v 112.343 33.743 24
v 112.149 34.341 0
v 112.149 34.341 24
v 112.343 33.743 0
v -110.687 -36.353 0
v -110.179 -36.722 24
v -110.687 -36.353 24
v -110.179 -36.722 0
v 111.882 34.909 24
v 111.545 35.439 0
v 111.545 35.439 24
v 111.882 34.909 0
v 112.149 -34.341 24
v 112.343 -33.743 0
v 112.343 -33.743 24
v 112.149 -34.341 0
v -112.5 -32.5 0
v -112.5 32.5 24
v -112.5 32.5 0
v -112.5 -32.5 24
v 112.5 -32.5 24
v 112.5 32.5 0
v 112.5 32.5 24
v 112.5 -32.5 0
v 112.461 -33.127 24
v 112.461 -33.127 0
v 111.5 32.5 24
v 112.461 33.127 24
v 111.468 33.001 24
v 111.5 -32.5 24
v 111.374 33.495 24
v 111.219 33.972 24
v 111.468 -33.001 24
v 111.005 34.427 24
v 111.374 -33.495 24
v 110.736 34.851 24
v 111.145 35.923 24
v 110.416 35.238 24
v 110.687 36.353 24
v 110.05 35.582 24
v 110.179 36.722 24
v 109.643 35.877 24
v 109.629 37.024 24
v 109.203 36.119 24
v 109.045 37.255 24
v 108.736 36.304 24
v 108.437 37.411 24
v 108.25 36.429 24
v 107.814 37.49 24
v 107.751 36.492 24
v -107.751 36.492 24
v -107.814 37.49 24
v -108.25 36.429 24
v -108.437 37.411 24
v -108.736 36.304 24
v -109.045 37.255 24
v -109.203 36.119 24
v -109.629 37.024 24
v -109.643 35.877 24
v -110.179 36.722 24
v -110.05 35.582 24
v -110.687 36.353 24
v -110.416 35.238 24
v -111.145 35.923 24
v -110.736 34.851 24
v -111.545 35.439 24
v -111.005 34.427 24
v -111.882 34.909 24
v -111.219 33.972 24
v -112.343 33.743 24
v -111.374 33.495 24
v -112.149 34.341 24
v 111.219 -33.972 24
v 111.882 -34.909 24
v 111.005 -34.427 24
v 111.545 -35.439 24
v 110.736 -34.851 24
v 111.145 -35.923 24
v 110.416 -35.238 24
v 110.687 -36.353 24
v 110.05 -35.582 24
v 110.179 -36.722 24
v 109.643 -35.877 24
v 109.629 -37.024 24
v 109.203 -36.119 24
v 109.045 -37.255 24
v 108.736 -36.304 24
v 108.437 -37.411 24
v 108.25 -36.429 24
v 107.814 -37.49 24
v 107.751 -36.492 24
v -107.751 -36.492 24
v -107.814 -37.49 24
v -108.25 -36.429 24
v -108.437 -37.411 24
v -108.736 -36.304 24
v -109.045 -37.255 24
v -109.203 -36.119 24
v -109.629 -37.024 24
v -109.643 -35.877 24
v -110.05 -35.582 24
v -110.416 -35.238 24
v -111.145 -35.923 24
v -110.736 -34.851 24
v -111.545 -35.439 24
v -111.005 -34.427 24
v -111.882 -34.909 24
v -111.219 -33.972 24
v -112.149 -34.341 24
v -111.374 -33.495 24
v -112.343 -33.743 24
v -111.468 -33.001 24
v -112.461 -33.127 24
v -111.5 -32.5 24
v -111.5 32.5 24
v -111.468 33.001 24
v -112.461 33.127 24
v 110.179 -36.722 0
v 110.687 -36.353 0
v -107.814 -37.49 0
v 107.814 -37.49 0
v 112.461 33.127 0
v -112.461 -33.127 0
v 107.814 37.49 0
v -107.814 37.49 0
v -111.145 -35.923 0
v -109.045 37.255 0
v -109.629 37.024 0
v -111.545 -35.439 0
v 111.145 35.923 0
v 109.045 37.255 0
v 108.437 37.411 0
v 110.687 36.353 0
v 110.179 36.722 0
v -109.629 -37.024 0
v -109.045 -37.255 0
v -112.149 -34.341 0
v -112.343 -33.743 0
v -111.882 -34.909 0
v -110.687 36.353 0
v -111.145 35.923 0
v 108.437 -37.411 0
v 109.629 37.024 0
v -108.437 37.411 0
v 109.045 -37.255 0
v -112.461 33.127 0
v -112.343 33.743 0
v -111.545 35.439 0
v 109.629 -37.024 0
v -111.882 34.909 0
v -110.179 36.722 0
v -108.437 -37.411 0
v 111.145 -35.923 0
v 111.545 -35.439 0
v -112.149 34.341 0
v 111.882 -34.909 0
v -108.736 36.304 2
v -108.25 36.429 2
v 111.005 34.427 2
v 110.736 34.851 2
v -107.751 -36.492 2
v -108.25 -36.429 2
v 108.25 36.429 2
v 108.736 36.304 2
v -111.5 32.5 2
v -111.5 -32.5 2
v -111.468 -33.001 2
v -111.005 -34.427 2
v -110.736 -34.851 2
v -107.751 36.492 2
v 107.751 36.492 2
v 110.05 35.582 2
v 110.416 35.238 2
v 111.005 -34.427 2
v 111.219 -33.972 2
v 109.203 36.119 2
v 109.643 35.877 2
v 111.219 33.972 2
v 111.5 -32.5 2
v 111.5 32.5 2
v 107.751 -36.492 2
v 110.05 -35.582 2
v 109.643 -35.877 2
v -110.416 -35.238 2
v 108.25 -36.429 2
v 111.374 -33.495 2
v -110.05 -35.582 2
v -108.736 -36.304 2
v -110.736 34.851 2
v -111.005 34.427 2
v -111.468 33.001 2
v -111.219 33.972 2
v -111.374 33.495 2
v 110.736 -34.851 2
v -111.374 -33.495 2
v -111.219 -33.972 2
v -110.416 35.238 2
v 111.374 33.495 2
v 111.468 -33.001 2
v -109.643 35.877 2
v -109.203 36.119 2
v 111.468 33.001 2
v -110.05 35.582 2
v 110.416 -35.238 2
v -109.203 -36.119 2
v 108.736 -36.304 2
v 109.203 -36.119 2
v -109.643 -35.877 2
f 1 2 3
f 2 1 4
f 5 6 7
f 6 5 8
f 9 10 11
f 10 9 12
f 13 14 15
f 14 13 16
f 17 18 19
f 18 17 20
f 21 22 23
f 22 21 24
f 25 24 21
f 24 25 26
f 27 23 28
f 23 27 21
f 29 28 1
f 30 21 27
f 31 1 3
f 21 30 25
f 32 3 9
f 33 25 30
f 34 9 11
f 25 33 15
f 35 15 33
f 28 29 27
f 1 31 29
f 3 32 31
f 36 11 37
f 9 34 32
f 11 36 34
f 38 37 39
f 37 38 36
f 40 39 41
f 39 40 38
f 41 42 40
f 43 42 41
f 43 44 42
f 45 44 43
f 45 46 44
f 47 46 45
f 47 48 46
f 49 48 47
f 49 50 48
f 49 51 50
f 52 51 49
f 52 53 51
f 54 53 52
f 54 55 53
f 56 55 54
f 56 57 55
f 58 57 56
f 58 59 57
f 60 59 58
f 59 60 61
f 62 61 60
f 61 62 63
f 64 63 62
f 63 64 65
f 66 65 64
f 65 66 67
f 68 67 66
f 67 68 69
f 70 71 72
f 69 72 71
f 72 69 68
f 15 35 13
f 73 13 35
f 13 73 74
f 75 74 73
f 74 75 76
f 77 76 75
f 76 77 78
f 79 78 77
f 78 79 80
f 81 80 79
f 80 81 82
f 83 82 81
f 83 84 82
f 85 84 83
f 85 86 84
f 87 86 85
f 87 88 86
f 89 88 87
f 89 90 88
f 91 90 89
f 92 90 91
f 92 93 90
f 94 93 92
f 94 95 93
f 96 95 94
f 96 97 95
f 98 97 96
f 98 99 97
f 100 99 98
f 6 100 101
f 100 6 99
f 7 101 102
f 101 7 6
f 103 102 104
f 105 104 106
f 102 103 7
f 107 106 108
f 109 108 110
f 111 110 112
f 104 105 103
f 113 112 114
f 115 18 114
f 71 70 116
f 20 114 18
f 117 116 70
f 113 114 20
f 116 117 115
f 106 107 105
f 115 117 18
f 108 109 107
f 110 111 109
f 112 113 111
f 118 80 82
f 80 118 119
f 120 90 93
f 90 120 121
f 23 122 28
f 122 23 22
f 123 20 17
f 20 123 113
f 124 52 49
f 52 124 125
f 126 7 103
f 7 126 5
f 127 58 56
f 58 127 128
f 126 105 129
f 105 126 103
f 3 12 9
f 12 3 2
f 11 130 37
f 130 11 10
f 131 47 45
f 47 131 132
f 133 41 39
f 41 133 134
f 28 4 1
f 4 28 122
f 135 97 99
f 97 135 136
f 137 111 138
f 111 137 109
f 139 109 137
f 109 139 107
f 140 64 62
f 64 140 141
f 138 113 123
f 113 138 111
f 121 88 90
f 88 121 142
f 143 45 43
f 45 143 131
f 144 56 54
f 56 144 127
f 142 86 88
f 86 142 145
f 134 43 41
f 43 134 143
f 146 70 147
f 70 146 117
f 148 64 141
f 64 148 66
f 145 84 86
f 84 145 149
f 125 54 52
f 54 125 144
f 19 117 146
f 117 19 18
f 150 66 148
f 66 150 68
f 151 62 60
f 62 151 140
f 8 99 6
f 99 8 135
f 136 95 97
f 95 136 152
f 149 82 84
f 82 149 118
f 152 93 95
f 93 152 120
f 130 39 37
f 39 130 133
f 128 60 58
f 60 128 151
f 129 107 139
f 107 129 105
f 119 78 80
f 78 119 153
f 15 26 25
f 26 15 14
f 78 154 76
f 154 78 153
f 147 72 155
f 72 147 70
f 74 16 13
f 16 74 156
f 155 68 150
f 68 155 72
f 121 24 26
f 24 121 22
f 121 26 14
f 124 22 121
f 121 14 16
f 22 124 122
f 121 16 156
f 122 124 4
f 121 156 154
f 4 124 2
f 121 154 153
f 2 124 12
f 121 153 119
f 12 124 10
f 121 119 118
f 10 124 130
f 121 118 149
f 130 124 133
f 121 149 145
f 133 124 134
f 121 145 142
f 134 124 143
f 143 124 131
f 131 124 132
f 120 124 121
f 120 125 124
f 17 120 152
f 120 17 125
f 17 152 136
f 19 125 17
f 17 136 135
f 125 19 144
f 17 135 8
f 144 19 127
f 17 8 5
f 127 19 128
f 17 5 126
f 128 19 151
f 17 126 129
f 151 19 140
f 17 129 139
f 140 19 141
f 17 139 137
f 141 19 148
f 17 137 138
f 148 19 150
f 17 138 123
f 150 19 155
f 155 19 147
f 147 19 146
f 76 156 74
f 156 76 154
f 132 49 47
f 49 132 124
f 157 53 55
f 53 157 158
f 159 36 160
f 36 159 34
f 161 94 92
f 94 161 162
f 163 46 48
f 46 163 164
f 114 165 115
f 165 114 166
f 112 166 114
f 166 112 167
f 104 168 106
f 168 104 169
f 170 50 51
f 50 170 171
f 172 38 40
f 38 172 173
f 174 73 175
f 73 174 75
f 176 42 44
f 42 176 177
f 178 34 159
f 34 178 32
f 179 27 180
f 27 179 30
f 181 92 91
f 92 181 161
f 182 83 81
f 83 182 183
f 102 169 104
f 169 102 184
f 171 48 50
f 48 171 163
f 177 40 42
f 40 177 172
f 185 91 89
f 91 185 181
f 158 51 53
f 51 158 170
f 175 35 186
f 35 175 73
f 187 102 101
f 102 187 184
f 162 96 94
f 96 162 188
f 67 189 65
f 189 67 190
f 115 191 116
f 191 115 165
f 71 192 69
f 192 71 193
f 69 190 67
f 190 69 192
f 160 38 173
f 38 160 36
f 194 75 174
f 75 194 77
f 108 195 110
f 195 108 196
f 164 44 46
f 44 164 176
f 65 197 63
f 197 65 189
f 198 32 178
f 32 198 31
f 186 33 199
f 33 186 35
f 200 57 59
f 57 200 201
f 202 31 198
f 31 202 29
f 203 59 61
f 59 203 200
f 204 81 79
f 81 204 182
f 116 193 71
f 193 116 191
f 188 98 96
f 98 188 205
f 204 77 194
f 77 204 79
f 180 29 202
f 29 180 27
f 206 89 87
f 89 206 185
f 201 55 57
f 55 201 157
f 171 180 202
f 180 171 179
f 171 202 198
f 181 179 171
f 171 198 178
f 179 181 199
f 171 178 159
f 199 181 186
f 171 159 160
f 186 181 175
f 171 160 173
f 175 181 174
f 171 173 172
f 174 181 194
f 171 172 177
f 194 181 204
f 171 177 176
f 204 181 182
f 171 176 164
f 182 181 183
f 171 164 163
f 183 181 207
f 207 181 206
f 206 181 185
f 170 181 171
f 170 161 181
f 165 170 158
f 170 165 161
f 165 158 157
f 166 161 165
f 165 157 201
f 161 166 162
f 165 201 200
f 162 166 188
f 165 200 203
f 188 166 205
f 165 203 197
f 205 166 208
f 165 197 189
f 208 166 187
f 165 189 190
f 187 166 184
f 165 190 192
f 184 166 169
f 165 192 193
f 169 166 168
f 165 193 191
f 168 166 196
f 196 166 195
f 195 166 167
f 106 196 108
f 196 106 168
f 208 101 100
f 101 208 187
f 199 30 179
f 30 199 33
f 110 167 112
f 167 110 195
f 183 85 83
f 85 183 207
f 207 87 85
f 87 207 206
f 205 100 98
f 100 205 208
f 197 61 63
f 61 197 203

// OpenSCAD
$fn = 50;


difference() {
	union() {
		hull() {
			translate(v = [-107.5000000000, 32.5000000000, 0]) {
				cylinder(h = 24, r = 5);
			}
			translate(v = [107.5000000000, 32.5000000000, 0]) {
				cylinder(h = 24, r = 5);
			}
			translate(v = [-107.5000000000, -32.5000000000, 0]) {
				cylinder(h = 24, r = 5);
			}
			translate(v = [107.5000000000, -32.5000000000, 0]) {
				cylinder(h = 24, r = 5);
			}
		}
	}
	union() {
		translate(v = [0, 0, 2]) {
			hull() {
				translate(v = [-107.5000000000, 32.5000000000, 0]) {
					cylinder(h = 22, r = 4);
				}
				translate(v = [107.5000000000, 32.5000000000, 0]) {
					cylinder(h = 22, r = 4);
				}
				translate(v = [-107.5000000000, -32.5000000000, 0]) {
					cylinder(h = 22, r = 4);
				}
				translate(v = [107.5000000000, -32.5000000000, 0]) {
					cylinder(h = 22, r = 4);
				}
			}
		}
	}
}
